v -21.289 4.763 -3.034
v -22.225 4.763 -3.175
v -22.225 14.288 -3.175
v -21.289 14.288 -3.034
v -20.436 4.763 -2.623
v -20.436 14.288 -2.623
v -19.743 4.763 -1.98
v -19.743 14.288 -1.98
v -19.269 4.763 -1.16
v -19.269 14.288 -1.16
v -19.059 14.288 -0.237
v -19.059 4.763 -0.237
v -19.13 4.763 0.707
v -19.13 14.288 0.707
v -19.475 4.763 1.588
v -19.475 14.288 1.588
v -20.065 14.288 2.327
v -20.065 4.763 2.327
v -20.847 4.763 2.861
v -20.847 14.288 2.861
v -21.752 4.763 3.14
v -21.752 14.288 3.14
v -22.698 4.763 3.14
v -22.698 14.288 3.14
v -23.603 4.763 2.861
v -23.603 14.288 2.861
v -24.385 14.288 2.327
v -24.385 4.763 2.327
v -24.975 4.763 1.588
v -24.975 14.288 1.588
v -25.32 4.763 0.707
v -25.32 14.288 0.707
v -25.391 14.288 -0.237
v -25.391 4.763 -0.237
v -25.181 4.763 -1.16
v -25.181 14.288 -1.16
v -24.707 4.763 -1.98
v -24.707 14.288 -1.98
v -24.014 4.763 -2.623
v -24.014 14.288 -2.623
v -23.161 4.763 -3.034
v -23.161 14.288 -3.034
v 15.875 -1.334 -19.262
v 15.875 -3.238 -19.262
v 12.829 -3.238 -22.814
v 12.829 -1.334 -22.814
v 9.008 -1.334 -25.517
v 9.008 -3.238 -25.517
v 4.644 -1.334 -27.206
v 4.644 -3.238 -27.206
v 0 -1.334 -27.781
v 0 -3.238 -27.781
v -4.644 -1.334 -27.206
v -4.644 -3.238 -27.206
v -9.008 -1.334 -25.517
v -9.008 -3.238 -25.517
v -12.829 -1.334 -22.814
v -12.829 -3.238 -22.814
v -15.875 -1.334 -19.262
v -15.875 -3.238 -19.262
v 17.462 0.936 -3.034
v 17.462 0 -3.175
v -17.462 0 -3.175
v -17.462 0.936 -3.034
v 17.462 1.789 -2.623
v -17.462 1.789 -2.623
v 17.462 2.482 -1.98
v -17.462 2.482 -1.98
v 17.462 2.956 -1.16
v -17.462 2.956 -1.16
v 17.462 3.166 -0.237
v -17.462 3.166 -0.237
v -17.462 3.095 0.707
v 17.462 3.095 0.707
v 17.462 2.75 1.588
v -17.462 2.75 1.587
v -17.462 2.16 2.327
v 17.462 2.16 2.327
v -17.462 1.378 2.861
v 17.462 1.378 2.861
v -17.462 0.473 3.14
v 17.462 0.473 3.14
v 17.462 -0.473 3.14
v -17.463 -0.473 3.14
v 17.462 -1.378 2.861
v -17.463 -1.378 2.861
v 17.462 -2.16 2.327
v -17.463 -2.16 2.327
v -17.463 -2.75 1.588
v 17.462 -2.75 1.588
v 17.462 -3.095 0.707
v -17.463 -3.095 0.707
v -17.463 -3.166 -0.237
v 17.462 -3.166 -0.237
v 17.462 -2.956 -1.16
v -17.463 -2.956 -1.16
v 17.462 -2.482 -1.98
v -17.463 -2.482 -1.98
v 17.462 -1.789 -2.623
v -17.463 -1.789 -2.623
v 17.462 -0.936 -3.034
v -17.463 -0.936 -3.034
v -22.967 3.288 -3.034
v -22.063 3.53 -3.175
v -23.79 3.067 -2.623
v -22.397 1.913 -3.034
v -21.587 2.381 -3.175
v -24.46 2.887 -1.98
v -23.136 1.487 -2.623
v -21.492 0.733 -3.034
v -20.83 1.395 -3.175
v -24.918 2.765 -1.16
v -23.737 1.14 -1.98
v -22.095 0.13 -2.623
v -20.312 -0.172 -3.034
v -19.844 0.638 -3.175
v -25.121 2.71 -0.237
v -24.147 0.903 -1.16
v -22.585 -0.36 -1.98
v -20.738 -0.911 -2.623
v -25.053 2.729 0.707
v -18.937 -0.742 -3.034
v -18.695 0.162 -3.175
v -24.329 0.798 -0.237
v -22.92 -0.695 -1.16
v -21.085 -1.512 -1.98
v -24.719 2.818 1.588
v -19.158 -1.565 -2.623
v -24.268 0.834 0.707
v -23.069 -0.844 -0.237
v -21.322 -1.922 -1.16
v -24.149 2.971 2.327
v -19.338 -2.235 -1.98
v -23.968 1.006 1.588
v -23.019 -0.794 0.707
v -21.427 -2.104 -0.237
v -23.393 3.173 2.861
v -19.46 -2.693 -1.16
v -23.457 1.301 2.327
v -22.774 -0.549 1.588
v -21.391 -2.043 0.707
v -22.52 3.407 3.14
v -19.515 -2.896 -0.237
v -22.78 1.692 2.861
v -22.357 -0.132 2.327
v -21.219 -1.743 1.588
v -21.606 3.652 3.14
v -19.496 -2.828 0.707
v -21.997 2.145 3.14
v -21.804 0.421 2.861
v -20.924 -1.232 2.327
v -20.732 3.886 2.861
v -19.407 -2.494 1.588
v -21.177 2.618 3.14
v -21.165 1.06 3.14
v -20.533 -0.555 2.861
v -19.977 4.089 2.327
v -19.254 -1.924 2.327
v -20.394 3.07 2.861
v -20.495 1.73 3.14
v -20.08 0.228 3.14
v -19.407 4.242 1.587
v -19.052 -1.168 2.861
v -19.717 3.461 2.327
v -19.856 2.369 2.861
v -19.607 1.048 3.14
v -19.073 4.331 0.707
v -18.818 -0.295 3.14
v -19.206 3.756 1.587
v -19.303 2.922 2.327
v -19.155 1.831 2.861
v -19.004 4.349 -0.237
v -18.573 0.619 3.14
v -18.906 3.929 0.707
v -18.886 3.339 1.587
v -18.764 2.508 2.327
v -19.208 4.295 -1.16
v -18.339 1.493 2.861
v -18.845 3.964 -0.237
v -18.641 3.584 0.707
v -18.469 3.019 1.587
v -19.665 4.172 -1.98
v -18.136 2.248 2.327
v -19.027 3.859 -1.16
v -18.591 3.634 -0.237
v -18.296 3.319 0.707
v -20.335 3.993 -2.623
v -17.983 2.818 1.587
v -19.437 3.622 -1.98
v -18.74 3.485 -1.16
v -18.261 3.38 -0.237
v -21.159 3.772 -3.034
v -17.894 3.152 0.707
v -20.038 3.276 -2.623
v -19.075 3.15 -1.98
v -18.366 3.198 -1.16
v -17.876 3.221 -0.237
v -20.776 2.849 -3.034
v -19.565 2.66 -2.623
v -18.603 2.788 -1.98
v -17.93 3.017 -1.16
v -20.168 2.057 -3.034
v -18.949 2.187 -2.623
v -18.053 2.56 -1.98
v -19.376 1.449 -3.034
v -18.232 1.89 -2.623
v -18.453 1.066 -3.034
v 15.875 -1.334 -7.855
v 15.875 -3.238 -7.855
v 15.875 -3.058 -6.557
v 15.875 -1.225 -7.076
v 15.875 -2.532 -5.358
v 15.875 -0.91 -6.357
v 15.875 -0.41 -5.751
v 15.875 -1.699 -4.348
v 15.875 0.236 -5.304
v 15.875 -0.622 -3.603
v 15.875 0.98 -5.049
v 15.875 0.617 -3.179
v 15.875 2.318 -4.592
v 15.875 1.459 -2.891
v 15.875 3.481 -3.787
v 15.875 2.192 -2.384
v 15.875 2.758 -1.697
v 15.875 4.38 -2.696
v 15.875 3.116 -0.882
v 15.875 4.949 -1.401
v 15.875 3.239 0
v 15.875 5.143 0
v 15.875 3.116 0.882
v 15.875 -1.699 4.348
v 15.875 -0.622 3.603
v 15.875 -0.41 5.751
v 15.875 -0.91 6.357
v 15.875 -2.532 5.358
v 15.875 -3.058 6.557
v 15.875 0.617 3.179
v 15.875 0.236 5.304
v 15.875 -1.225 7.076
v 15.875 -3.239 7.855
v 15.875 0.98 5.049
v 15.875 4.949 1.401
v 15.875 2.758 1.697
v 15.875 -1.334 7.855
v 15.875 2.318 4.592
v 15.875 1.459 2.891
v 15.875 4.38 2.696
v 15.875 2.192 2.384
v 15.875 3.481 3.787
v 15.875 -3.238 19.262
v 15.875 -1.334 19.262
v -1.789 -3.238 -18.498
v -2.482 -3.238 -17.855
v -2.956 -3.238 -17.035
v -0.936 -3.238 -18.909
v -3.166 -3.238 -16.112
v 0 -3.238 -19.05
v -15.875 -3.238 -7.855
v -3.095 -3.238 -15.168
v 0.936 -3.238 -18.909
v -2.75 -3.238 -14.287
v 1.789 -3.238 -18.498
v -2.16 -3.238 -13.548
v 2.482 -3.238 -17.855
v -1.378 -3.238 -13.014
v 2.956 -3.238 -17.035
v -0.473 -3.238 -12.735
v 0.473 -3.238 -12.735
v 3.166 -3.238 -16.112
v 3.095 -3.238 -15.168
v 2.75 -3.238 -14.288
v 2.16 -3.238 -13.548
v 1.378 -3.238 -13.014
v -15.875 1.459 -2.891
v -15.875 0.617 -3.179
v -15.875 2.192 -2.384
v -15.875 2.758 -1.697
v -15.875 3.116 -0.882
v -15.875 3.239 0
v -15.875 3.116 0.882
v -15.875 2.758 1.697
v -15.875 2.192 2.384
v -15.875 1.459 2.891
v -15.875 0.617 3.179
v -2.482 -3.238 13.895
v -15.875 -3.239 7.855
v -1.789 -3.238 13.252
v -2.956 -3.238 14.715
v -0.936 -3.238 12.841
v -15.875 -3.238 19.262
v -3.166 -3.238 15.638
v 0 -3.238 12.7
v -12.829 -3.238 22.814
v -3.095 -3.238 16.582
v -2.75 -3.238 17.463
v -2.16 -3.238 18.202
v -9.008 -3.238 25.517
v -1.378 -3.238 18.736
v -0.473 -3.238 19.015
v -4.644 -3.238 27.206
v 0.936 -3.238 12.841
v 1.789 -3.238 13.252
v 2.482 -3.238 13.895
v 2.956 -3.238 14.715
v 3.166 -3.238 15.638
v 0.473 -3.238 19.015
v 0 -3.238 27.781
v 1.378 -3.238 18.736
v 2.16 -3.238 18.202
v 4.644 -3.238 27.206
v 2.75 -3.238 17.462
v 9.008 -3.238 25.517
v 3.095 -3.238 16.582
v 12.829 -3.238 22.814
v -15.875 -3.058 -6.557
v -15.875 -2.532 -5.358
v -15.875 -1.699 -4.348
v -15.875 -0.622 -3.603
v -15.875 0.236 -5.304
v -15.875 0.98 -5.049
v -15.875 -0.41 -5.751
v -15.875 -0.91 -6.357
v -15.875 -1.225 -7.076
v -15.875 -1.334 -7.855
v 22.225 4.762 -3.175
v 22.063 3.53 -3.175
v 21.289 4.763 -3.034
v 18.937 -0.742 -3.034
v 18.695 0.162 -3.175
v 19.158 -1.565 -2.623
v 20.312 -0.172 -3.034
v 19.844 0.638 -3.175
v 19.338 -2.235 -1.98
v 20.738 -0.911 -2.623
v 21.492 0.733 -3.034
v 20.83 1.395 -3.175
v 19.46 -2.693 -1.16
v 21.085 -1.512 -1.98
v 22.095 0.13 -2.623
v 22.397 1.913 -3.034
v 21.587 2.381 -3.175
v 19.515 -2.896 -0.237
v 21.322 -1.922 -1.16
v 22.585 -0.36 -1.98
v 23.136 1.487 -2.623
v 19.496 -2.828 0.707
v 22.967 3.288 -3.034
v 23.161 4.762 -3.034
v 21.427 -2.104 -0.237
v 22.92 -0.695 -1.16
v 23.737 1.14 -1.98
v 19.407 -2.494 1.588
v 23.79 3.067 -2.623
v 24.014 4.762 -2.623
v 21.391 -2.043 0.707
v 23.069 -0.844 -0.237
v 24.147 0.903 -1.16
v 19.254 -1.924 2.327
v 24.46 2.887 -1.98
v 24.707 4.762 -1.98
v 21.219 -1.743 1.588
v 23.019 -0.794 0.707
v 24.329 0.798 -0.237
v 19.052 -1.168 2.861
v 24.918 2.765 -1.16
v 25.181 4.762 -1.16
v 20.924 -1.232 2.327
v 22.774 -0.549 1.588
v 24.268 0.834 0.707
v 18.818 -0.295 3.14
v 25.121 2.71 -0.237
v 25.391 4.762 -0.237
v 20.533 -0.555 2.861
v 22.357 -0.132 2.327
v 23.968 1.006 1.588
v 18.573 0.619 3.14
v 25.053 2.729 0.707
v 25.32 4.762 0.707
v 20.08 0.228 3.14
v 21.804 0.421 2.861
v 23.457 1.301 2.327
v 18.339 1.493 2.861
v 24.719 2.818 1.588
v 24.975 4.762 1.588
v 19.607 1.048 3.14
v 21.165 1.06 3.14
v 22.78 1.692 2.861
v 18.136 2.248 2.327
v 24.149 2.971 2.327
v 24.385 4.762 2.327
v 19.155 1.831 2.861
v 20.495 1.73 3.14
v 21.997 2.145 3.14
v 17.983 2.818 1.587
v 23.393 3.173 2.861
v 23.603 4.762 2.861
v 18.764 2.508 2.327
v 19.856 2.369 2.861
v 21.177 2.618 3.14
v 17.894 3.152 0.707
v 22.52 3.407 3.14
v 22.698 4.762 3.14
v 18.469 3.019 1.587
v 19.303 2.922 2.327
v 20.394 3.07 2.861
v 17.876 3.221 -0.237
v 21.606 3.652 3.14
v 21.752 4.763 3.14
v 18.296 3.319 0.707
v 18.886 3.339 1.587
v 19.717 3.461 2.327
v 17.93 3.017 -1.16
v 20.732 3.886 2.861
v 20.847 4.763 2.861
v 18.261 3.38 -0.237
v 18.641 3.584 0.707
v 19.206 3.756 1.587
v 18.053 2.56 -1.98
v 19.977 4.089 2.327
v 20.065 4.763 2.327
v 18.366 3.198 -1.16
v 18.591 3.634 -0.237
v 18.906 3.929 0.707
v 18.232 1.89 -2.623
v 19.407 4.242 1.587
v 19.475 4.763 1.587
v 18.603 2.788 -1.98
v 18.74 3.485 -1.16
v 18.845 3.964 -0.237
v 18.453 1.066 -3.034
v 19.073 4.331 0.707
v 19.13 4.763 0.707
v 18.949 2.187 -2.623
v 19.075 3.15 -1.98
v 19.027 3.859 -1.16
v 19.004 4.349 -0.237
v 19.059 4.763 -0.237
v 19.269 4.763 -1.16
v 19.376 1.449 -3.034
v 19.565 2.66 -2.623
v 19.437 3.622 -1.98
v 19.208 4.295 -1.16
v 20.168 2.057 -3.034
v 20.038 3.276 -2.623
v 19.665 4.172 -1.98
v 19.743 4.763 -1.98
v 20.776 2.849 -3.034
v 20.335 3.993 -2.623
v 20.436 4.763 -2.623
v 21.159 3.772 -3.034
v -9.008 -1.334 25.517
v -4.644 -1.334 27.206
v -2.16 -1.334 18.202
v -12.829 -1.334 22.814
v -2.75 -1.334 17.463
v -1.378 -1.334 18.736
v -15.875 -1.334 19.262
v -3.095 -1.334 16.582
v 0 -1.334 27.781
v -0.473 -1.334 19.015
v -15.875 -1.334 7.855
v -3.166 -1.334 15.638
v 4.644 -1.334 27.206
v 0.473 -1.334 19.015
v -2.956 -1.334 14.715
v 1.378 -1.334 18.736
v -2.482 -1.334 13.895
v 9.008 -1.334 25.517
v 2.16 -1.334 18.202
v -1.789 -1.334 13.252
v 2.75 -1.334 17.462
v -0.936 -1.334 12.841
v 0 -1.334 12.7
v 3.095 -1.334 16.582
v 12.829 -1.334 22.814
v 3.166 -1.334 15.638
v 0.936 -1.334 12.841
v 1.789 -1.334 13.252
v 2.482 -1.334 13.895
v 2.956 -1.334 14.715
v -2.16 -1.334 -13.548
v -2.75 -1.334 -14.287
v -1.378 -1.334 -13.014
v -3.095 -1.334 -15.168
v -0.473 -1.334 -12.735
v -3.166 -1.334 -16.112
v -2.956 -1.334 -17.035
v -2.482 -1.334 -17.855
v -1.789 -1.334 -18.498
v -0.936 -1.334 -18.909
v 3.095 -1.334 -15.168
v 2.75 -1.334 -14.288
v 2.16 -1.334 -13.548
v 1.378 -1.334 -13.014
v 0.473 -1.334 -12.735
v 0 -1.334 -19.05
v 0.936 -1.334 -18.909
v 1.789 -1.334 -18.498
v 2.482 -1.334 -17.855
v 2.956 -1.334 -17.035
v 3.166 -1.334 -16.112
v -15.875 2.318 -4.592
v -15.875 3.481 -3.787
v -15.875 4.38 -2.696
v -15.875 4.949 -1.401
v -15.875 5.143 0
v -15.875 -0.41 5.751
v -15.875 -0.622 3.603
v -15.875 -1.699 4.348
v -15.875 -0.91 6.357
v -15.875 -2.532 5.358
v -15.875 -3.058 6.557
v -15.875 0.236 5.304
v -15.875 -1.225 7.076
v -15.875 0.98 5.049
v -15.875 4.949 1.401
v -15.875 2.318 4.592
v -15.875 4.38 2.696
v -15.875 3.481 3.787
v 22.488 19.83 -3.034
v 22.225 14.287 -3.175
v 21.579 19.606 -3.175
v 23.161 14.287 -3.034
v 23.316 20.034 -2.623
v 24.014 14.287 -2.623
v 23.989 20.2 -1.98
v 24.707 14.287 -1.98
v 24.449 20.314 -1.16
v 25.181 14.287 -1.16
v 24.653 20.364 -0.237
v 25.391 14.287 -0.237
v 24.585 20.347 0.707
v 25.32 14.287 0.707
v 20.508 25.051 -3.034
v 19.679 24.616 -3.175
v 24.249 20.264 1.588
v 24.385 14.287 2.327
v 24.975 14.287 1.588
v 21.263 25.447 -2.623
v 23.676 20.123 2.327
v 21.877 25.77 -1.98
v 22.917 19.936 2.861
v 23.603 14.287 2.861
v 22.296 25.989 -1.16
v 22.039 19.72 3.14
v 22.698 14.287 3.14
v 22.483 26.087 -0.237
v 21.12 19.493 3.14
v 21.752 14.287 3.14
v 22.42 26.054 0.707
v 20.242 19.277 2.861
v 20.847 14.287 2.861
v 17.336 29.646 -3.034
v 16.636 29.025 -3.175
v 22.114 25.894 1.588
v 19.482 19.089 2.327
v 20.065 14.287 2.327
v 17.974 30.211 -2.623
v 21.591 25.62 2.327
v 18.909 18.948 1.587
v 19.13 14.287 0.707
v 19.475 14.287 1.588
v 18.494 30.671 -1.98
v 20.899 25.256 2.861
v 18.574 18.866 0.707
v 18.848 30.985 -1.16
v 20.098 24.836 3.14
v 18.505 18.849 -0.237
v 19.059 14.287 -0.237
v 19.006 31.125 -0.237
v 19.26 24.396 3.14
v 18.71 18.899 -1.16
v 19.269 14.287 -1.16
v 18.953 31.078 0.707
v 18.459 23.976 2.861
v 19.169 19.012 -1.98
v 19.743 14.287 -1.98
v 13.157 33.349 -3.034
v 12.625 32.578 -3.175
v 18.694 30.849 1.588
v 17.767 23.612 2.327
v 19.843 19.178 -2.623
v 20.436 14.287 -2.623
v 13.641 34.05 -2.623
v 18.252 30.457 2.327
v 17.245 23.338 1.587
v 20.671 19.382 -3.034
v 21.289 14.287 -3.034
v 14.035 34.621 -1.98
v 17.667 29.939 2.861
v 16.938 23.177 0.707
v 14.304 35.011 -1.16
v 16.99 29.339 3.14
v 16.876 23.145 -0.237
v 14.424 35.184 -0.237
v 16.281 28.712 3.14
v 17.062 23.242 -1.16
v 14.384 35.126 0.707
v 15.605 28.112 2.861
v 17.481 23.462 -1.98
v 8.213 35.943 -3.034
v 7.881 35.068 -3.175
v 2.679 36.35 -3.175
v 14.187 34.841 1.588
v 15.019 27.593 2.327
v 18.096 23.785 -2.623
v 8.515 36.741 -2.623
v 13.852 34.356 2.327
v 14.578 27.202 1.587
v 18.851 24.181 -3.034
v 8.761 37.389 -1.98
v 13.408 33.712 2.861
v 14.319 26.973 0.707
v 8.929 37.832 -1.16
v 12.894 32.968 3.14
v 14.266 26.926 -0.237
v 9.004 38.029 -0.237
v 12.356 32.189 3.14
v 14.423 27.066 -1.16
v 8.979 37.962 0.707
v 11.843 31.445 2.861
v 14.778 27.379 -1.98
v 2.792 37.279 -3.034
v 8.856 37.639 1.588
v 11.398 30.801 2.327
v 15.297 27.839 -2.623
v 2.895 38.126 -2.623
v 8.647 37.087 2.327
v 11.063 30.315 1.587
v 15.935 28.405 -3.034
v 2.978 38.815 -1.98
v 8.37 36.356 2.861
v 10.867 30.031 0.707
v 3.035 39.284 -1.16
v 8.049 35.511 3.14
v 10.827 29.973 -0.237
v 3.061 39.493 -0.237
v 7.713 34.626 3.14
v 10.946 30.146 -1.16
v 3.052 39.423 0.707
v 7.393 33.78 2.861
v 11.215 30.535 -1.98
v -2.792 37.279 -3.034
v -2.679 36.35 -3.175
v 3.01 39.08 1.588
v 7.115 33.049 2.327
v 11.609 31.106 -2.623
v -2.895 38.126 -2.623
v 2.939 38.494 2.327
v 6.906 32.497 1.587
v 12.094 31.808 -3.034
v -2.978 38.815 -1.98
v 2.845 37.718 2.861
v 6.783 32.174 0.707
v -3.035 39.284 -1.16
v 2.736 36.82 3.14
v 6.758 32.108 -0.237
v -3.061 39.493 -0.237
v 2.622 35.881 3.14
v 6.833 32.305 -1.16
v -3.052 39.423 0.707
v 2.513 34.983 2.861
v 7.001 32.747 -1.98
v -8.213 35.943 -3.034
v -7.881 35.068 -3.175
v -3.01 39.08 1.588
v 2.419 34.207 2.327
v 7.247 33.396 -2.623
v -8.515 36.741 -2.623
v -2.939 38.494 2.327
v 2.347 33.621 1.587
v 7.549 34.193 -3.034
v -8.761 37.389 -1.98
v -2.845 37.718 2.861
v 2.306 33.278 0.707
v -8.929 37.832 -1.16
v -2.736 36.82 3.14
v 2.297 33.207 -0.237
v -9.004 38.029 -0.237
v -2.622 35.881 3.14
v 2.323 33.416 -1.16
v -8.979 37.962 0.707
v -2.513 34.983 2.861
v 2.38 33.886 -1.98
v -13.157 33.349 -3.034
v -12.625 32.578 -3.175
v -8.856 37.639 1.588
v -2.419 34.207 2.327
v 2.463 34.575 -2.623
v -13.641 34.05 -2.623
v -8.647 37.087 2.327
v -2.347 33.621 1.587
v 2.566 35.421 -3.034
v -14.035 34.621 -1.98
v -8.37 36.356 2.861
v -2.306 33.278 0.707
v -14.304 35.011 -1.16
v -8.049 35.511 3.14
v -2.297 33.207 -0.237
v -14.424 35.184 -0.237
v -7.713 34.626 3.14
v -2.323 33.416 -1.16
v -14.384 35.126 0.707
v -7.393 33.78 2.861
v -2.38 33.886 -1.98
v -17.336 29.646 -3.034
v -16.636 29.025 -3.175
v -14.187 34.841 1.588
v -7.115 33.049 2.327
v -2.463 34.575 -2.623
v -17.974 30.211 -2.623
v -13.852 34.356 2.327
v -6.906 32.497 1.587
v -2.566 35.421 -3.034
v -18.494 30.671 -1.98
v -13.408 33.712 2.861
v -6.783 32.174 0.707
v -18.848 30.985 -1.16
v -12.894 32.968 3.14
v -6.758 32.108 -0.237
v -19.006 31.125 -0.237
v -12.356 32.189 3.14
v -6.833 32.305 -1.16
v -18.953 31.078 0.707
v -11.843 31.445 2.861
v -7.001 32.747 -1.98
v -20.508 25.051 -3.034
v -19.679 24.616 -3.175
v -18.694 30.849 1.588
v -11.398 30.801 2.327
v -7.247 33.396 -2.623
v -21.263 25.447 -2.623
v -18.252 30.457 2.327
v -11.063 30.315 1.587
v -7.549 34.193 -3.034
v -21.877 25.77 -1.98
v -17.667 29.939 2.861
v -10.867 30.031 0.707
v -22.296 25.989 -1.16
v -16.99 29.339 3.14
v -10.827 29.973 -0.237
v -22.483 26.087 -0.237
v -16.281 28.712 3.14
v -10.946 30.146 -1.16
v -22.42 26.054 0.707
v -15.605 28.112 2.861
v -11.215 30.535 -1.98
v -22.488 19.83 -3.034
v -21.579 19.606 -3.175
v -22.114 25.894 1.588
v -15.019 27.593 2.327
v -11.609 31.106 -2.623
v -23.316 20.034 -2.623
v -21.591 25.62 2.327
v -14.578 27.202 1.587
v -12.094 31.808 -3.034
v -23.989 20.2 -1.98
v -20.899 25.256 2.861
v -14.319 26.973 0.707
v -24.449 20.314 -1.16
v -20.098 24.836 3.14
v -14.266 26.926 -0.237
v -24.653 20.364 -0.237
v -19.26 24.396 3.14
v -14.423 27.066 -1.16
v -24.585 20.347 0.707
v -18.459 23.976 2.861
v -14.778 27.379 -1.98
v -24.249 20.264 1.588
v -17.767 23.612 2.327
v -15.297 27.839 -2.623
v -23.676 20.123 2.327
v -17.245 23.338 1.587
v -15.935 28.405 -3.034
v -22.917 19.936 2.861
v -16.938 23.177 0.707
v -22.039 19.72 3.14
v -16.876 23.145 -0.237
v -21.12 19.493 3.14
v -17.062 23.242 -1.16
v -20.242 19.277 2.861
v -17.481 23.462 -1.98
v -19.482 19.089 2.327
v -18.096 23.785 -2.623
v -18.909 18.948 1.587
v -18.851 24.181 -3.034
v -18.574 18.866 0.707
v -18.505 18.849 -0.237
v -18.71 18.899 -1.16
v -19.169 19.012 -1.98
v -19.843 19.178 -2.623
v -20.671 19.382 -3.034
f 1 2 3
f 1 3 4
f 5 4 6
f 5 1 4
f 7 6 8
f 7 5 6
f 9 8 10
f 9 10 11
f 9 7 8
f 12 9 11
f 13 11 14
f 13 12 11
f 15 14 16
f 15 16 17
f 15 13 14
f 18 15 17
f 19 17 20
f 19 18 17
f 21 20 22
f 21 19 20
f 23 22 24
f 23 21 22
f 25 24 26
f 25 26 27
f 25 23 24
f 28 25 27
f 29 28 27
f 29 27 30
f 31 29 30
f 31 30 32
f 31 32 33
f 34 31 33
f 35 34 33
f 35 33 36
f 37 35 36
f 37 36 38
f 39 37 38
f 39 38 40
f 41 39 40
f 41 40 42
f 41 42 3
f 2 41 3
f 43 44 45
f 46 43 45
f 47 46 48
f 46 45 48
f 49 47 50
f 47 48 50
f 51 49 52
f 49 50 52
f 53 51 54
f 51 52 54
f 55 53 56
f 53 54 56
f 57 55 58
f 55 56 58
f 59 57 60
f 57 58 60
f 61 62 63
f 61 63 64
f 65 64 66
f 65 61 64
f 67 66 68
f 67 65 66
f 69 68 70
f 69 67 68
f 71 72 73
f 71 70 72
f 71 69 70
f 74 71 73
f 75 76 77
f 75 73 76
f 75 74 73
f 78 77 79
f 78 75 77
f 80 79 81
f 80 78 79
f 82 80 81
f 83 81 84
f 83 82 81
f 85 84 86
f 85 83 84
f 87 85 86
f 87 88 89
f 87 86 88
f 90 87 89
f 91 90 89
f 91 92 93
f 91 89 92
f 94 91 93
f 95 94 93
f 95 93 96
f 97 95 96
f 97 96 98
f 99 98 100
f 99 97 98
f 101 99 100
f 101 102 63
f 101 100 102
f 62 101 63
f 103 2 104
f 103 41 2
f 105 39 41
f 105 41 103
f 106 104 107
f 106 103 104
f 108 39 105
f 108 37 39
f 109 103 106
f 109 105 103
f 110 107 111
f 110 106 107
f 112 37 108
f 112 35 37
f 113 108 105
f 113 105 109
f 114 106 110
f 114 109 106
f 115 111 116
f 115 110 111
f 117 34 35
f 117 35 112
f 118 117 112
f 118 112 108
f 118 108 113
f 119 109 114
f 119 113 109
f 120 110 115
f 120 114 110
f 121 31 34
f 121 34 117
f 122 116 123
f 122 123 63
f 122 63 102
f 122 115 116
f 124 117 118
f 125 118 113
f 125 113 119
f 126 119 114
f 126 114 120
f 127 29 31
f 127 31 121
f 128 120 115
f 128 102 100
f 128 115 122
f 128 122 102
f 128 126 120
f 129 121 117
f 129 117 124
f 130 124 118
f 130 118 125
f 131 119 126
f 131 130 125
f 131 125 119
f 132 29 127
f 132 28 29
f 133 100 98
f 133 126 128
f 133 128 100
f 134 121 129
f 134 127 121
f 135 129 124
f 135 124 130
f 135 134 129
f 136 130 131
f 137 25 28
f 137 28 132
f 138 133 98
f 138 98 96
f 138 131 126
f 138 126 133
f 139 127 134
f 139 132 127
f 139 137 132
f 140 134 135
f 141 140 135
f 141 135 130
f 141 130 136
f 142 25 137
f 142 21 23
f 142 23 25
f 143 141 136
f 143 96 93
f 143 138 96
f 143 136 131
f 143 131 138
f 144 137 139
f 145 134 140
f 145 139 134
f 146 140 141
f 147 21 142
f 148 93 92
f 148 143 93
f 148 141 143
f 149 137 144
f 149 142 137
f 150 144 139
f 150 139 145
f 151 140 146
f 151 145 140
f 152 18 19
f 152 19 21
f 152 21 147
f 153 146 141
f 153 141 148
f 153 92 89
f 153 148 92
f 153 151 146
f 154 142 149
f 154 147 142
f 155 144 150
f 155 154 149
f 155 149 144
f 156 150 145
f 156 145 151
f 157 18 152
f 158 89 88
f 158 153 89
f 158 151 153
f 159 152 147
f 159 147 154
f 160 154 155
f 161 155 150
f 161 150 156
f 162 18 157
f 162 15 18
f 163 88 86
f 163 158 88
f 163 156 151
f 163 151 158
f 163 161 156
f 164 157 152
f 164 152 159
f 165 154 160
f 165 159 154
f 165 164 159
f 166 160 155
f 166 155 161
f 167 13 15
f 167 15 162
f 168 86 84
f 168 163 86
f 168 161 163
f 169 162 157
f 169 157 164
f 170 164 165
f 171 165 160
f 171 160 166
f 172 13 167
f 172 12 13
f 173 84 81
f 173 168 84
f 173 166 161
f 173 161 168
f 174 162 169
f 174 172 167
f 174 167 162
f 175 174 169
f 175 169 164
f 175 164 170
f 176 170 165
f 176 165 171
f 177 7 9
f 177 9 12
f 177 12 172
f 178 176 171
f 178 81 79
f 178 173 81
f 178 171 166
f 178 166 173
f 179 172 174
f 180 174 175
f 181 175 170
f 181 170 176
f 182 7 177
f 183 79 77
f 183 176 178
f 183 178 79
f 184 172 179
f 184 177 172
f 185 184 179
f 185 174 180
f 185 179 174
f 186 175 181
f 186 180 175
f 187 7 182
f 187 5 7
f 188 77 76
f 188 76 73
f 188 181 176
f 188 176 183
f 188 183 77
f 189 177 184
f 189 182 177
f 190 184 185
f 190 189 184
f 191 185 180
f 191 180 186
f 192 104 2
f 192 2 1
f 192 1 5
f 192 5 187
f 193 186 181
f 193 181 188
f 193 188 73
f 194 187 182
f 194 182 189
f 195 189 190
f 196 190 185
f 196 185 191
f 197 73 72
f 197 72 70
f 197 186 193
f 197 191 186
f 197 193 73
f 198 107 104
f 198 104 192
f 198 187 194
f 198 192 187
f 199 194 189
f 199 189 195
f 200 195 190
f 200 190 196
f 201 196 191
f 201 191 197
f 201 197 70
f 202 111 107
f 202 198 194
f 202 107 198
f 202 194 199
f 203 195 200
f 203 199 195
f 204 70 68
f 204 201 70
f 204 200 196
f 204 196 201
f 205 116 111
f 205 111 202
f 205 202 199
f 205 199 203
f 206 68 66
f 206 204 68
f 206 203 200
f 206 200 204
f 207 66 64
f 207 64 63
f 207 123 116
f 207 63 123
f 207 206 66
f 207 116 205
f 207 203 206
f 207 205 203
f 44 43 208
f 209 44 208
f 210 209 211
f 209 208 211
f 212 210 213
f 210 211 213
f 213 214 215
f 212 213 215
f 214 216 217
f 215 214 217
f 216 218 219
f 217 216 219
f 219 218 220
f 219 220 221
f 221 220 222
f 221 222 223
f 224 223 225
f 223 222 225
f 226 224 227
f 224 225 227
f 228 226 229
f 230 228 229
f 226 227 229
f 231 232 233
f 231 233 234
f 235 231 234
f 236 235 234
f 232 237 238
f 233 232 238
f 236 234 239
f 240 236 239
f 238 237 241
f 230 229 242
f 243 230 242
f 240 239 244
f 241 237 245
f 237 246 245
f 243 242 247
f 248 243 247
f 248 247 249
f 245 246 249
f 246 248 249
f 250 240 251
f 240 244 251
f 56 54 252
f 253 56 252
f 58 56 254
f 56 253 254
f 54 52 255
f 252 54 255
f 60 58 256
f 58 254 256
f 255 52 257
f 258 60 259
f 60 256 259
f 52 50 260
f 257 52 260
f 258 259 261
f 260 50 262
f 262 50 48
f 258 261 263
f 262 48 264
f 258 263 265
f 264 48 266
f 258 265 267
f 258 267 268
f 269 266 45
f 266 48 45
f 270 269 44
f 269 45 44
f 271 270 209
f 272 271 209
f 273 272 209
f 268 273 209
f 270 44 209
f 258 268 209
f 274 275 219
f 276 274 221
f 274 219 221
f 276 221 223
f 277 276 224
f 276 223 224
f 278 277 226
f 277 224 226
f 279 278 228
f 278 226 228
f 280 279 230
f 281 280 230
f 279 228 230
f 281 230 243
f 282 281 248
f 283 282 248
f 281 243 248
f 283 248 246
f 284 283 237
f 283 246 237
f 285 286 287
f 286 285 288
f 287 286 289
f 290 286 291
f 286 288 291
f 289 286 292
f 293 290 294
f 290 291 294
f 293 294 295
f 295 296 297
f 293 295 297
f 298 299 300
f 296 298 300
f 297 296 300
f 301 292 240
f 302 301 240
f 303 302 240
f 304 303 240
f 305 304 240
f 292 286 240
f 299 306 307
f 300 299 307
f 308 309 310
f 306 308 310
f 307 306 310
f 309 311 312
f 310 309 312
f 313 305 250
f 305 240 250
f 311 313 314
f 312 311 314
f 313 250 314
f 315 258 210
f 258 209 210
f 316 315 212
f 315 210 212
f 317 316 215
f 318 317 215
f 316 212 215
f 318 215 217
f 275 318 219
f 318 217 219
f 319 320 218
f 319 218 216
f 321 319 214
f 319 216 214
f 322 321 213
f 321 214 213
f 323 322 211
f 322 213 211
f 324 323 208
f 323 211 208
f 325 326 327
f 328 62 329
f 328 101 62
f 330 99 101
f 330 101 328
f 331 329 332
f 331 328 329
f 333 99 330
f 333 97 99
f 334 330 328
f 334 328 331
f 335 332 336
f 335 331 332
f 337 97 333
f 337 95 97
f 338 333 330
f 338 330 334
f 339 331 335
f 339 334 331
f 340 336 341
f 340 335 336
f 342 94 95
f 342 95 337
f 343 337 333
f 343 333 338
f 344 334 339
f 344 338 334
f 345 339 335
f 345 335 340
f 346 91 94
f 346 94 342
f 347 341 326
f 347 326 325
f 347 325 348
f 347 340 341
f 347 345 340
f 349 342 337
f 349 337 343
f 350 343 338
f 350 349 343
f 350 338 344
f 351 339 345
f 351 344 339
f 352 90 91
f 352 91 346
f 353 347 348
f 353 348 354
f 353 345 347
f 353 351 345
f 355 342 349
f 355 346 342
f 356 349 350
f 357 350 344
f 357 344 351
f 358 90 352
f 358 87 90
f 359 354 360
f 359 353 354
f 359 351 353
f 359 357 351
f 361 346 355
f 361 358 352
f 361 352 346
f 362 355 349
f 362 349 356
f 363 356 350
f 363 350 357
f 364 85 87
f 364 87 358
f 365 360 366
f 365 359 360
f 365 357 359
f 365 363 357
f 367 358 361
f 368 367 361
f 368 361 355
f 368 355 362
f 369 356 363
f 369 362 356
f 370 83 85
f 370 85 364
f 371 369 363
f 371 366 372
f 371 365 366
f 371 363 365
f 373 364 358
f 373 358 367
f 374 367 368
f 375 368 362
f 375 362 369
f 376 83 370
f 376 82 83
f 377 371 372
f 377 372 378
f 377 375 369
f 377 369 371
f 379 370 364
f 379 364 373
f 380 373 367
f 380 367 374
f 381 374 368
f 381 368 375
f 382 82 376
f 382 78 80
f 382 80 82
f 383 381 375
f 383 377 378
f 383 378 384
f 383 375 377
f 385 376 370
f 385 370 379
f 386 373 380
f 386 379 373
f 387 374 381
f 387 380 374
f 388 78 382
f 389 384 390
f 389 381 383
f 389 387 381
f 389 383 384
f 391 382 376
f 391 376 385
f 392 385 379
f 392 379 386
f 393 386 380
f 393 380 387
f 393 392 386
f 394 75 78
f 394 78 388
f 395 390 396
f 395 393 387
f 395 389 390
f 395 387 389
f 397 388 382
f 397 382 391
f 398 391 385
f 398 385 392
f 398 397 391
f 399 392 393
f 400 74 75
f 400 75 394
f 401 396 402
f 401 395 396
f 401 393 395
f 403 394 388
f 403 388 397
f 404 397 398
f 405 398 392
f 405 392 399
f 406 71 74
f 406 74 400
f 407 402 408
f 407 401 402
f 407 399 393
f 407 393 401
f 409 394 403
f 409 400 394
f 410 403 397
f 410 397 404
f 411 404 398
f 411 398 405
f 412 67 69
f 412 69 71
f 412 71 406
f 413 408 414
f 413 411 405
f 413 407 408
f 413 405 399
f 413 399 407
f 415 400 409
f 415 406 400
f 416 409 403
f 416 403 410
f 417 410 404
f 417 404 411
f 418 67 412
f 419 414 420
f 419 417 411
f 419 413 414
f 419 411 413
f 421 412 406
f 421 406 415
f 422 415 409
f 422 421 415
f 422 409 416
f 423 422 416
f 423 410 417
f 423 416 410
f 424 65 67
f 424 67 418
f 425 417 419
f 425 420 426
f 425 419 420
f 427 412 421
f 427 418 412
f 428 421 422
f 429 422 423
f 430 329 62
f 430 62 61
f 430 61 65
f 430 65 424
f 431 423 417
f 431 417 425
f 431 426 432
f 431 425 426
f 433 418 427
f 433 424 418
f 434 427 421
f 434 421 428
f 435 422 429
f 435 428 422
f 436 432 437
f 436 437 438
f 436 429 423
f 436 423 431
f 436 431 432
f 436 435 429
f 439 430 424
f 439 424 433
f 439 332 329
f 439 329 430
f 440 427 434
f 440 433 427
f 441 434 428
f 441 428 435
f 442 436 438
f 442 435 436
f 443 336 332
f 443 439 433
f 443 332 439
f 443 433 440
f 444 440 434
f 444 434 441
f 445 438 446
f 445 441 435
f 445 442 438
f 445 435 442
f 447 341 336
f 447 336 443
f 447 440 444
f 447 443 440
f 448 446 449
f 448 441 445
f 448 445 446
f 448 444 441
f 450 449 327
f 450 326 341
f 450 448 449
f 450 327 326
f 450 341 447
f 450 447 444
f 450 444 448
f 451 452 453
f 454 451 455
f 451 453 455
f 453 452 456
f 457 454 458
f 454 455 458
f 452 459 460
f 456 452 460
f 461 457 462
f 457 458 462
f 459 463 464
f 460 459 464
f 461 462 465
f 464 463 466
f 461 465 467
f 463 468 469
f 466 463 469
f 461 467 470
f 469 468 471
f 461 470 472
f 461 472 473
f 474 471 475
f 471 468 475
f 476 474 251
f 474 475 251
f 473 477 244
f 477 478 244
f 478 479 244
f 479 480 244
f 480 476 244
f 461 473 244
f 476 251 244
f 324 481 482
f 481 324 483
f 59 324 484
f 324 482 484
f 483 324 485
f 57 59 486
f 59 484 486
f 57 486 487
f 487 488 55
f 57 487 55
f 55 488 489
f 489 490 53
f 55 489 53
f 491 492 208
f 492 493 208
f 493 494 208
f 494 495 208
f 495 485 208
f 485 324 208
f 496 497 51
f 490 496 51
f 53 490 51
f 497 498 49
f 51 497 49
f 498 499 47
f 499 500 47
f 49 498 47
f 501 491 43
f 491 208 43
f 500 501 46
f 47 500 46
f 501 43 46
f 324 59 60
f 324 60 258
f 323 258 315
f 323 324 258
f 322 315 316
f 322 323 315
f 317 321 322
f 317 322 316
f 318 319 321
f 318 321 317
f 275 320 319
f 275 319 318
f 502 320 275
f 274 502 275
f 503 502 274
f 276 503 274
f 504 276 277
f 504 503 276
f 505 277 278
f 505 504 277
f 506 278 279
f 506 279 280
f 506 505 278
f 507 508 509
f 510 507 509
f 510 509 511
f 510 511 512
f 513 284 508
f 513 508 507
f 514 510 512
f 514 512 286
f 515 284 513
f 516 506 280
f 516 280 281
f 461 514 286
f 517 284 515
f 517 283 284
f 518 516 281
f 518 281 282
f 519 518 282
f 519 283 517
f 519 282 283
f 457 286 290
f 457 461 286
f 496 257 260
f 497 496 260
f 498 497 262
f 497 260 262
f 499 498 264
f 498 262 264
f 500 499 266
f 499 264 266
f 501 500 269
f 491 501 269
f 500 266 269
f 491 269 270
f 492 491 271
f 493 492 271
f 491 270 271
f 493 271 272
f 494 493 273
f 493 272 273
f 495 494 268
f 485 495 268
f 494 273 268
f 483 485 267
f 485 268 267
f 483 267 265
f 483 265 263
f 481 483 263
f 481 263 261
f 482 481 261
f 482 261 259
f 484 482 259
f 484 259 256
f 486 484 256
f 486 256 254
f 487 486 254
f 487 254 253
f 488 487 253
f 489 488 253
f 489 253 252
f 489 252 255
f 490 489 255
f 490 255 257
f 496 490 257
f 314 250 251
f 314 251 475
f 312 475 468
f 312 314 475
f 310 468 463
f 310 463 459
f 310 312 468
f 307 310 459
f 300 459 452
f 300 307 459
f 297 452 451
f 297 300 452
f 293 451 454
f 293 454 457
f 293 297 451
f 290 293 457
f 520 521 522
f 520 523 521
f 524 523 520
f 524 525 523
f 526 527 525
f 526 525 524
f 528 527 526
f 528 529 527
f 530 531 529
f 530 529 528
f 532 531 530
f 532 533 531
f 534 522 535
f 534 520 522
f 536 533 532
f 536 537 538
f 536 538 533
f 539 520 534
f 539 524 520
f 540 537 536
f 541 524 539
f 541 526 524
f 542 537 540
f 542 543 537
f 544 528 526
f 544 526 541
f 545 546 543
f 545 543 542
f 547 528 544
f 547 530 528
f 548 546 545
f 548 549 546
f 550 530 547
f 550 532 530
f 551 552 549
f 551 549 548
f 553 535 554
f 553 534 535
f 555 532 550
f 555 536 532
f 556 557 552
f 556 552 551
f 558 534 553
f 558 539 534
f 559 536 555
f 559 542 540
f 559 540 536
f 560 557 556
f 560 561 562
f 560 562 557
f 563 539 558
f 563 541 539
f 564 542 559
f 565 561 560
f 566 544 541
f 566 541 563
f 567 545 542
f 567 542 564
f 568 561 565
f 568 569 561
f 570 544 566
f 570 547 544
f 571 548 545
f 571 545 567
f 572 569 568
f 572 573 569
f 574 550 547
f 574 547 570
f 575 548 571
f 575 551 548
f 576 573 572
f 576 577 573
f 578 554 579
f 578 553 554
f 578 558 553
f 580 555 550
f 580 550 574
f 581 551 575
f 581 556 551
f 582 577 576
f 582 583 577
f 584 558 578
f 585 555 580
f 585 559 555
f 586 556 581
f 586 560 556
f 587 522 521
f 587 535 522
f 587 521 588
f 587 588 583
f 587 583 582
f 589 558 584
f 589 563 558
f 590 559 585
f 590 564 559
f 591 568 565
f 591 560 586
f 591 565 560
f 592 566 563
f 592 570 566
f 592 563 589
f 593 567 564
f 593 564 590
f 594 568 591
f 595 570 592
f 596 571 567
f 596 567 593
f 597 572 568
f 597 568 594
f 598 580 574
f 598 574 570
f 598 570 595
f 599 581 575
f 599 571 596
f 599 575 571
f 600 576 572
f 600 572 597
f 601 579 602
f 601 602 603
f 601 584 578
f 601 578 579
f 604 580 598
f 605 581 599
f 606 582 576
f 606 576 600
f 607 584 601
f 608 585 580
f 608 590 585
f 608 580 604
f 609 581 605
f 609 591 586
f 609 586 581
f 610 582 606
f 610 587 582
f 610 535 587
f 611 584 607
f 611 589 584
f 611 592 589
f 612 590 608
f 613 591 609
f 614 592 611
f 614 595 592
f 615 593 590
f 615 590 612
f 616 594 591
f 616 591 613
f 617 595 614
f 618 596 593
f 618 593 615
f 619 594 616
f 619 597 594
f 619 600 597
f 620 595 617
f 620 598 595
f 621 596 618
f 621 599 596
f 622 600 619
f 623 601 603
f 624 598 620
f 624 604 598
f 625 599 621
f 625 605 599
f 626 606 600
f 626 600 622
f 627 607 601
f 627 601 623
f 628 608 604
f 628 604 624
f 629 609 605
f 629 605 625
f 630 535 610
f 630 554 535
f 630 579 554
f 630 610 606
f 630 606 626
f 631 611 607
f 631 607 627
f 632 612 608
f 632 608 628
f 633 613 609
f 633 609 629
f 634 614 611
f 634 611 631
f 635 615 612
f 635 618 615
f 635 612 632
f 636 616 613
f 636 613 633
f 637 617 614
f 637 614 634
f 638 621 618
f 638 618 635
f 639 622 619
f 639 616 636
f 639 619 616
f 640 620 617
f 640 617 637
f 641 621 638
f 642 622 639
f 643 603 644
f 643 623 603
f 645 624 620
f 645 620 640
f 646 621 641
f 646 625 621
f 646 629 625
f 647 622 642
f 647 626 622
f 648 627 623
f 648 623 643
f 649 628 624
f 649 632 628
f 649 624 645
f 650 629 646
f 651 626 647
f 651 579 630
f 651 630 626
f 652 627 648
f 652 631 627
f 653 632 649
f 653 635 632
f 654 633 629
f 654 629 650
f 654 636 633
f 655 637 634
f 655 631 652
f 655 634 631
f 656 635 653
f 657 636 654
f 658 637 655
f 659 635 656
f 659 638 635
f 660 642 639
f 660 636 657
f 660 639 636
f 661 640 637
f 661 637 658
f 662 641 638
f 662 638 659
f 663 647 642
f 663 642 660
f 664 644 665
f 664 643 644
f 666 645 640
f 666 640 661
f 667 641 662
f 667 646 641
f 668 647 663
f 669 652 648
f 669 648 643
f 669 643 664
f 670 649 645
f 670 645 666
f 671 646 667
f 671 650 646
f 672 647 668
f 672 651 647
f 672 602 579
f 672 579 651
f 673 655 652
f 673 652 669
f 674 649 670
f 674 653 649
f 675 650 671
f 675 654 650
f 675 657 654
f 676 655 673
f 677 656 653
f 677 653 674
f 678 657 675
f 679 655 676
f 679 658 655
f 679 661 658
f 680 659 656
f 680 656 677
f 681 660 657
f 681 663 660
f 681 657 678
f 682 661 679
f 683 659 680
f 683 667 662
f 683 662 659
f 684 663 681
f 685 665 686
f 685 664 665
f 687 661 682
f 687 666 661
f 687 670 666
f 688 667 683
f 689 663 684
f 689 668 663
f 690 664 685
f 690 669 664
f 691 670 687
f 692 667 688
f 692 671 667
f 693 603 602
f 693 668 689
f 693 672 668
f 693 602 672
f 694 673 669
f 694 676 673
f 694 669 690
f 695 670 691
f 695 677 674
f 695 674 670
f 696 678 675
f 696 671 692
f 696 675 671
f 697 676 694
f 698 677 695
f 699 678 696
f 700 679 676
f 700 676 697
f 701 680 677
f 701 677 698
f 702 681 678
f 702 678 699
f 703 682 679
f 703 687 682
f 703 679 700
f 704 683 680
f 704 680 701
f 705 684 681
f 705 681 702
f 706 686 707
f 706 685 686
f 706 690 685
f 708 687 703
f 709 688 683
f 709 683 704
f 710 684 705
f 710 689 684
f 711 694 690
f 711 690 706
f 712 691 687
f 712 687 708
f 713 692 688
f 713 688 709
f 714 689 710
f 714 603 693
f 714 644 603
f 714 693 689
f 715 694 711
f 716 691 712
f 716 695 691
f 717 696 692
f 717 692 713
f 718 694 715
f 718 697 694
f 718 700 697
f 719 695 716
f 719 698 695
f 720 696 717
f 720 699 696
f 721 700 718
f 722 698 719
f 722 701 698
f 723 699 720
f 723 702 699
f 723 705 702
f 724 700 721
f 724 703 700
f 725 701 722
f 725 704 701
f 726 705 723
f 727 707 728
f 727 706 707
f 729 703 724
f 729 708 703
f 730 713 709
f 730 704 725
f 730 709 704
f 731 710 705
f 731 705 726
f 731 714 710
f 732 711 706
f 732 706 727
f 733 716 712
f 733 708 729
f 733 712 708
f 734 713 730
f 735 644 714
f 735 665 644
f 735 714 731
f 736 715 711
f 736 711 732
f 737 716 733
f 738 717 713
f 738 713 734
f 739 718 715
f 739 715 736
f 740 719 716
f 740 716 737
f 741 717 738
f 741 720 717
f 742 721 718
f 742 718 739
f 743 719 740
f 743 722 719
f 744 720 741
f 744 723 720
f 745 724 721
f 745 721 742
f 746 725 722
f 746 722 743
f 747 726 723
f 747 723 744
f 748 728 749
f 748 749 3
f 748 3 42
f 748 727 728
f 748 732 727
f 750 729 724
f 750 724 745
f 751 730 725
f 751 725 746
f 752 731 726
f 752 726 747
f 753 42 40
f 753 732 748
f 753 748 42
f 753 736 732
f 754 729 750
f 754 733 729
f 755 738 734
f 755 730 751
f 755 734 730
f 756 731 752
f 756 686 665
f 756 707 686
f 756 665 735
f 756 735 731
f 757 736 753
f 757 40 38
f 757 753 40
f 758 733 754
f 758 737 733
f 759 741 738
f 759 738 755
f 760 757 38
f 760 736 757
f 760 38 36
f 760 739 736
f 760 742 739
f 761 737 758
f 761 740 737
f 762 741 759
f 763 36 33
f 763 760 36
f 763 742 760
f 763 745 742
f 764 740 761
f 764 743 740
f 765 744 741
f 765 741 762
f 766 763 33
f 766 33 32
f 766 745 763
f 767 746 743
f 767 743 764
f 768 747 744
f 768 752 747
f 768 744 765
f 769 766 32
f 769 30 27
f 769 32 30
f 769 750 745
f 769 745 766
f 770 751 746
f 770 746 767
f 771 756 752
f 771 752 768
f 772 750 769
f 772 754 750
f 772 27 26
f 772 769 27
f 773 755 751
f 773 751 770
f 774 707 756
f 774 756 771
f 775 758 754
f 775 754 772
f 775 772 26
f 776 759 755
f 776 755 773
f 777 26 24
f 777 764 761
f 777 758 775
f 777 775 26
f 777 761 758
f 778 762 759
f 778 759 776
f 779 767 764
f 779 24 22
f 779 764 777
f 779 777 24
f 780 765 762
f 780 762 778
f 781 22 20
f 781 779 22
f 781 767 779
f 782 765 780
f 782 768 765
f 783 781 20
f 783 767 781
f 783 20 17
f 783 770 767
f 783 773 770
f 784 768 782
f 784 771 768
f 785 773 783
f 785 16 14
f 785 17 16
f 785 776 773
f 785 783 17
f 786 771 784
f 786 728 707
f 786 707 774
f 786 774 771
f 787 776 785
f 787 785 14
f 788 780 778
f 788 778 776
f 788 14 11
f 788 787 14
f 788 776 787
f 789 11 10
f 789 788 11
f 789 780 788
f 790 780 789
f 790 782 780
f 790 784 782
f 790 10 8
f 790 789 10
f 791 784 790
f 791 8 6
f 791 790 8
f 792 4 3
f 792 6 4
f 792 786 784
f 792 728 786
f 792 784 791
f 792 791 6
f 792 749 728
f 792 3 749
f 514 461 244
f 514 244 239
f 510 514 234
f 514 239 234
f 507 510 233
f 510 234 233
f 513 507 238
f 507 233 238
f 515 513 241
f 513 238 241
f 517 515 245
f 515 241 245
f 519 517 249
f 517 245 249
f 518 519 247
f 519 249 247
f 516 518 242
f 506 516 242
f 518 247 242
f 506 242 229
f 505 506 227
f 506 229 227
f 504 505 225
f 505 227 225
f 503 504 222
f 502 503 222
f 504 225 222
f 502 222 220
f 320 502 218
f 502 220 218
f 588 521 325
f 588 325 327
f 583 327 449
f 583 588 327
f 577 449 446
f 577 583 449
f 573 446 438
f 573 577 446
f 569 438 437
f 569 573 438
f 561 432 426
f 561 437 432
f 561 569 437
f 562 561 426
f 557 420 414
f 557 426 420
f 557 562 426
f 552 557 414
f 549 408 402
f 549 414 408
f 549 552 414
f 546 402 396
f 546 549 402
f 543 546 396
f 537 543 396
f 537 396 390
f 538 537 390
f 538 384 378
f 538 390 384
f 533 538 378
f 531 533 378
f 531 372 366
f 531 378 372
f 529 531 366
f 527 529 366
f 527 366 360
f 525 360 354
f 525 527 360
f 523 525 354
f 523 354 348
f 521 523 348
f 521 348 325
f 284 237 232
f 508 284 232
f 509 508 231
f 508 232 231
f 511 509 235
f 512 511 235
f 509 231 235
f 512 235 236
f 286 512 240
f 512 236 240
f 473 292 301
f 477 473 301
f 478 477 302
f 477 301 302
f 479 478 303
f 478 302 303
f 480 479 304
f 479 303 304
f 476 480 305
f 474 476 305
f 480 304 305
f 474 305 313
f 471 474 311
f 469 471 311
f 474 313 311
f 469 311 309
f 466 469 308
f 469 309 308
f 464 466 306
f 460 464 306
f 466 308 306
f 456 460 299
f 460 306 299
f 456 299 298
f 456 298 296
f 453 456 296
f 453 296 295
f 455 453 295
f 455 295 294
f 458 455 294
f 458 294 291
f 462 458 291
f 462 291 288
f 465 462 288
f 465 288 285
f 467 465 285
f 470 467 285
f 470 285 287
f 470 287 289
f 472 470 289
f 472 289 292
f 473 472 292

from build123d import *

# Parameters (mm, degrees)
SKETCH2_R           = 3.175
BOSS_EXTRUDE1_DEPTH = 15.875
SKETCH4_R           = 3.175
CUT_EXTRUDE1_DEPTH  = 58.092900971


with BuildPart() as part:
    # Sweep1: sweep along a path in Sketch1
    with BuildLine(Plane.XY) as sweep1_path:
        Line((-22.225, 14.2875), (-22.225, 4.7625))
        ThreePointArc((-22.225, 4.7625), (-20.830096045, 1.394903955), (-17.4625, 0))
        Line((-17.4625, 0), (17.4625, 0))
        ThreePointArc((17.4625, 0), (20.830096045, 1.394903955), (22.225, 4.7625))
        Line((22.225, 4.7625), (22.225, 14.2875))
        ThreePointArc((22.225, 14.2875), (0, 36.5125), (-22.225, 14.2875))
    # Sketch2 → Sweep1 (sweep)
    with BuildSketch(Plane(origin=(0, 0, 0), x_dir=(0, 0, -1), z_dir=(1, 0, 0))):
        Circle(SKETCH2_R)
    sweep(path=sweep1_path.line)


with BuildPart() as body_2:
    # Sketch3 → Boss-Extrude1 (new, symmetric)
    with BuildSketch(Plane(origin=(0, 0, 0), x_dir=(0, 0, -1), z_dir=(1, 0, 0))):
        with BuildLine():
            Line((-27.78125, -3.2385), (-27.78125, -1.3335))
            Line((-27.78125, -1.3335), (-7.854516217, -1.3335))
            ThreePointArc((-7.854516217, -1.3335), (-6.03654897, -0.680609113), (-5.049331854, 0.979714286))
            ThreePointArc((-5.049331854, 0.979714286), (0, 5.1435), (5.049331854, 0.979714286))
            ThreePointArc((5.049331854, 0.979714286), (6.03654897, -0.680609113), (7.854516217, -1.3335))
            Line((7.854516217, -1.3335), (27.78125, -1.3335))
            Line((27.78125, -1.3335), (27.78125, -3.2385))
            Line((27.78125, -3.2385), (7.854516217, -3.2385))
            ThreePointArc((7.854516217, -3.2385), (4.824570805, -2.150348521), (3.179208945, 0.616857143))
            ThreePointArc((3.179208945, 0.616857143), (0, 3.2385), (-3.179208945, 0.616857143))
            ThreePointArc((-3.179208945, 0.616857143), (-4.824570805, -2.150348521), (-7.854516217, -3.2385))
            Line((-7.854516217, -3.2385), (-27.78125, -3.2385))
        make_face()
    extrude(amount=BOSS_EXTRUDE1_DEPTH, both=True)

    # Sketch4 → Cut-Extrude1 (cut, through all)
    with BuildSketch(Plane.XZ.offset(3.2385)):
        with Locations(Location((0, 15.875, 0), (0, 0, 270))):
            Circle(SKETCH4_R)
        with Locations(Location((0, -15.875, 0), (0, 0, 270))):
            Circle(SKETCH4_R)
        with BuildLine():
            Line((-15.875, 19.261533709), (-15.875, 27.78125))
            Line((-15.875, 27.78125), (-15.875, 28.03525))
            Line((-15.875, 28.03525), (15.875, 28.03525))
            Line((15.875, 28.03525), (15.875, 27.78125))
            Line((15.875, 27.78125), (15.875, 19.261533709))
            ThreePointArc((15.875, 19.261533709), (0, 27.78125), (-15.875, 19.261533709))
        make_face()
        with BuildLine():
            Line((15.875, -27.78125), (15.875, -19.261533709))
            ThreePointArc((15.875, -19.261533709), (0, -27.78125), (-15.875, -19.261533709))
            Line((-15.875, -19.261533709), (-15.875, -27.78125))
            Line((-15.875, -27.78125), (-15.875, -28.03525))
            Line((-15.875, -28.03525), (15.875, -28.03525))
            Line((15.875, -28.03525), (15.875, -27.78125))
        make_face()
    extrude(amount=-CUT_EXTRUDE1_DEPTH, mode=Mode.SUBTRACT)


solid = Compound([part.part, body_2.part])
